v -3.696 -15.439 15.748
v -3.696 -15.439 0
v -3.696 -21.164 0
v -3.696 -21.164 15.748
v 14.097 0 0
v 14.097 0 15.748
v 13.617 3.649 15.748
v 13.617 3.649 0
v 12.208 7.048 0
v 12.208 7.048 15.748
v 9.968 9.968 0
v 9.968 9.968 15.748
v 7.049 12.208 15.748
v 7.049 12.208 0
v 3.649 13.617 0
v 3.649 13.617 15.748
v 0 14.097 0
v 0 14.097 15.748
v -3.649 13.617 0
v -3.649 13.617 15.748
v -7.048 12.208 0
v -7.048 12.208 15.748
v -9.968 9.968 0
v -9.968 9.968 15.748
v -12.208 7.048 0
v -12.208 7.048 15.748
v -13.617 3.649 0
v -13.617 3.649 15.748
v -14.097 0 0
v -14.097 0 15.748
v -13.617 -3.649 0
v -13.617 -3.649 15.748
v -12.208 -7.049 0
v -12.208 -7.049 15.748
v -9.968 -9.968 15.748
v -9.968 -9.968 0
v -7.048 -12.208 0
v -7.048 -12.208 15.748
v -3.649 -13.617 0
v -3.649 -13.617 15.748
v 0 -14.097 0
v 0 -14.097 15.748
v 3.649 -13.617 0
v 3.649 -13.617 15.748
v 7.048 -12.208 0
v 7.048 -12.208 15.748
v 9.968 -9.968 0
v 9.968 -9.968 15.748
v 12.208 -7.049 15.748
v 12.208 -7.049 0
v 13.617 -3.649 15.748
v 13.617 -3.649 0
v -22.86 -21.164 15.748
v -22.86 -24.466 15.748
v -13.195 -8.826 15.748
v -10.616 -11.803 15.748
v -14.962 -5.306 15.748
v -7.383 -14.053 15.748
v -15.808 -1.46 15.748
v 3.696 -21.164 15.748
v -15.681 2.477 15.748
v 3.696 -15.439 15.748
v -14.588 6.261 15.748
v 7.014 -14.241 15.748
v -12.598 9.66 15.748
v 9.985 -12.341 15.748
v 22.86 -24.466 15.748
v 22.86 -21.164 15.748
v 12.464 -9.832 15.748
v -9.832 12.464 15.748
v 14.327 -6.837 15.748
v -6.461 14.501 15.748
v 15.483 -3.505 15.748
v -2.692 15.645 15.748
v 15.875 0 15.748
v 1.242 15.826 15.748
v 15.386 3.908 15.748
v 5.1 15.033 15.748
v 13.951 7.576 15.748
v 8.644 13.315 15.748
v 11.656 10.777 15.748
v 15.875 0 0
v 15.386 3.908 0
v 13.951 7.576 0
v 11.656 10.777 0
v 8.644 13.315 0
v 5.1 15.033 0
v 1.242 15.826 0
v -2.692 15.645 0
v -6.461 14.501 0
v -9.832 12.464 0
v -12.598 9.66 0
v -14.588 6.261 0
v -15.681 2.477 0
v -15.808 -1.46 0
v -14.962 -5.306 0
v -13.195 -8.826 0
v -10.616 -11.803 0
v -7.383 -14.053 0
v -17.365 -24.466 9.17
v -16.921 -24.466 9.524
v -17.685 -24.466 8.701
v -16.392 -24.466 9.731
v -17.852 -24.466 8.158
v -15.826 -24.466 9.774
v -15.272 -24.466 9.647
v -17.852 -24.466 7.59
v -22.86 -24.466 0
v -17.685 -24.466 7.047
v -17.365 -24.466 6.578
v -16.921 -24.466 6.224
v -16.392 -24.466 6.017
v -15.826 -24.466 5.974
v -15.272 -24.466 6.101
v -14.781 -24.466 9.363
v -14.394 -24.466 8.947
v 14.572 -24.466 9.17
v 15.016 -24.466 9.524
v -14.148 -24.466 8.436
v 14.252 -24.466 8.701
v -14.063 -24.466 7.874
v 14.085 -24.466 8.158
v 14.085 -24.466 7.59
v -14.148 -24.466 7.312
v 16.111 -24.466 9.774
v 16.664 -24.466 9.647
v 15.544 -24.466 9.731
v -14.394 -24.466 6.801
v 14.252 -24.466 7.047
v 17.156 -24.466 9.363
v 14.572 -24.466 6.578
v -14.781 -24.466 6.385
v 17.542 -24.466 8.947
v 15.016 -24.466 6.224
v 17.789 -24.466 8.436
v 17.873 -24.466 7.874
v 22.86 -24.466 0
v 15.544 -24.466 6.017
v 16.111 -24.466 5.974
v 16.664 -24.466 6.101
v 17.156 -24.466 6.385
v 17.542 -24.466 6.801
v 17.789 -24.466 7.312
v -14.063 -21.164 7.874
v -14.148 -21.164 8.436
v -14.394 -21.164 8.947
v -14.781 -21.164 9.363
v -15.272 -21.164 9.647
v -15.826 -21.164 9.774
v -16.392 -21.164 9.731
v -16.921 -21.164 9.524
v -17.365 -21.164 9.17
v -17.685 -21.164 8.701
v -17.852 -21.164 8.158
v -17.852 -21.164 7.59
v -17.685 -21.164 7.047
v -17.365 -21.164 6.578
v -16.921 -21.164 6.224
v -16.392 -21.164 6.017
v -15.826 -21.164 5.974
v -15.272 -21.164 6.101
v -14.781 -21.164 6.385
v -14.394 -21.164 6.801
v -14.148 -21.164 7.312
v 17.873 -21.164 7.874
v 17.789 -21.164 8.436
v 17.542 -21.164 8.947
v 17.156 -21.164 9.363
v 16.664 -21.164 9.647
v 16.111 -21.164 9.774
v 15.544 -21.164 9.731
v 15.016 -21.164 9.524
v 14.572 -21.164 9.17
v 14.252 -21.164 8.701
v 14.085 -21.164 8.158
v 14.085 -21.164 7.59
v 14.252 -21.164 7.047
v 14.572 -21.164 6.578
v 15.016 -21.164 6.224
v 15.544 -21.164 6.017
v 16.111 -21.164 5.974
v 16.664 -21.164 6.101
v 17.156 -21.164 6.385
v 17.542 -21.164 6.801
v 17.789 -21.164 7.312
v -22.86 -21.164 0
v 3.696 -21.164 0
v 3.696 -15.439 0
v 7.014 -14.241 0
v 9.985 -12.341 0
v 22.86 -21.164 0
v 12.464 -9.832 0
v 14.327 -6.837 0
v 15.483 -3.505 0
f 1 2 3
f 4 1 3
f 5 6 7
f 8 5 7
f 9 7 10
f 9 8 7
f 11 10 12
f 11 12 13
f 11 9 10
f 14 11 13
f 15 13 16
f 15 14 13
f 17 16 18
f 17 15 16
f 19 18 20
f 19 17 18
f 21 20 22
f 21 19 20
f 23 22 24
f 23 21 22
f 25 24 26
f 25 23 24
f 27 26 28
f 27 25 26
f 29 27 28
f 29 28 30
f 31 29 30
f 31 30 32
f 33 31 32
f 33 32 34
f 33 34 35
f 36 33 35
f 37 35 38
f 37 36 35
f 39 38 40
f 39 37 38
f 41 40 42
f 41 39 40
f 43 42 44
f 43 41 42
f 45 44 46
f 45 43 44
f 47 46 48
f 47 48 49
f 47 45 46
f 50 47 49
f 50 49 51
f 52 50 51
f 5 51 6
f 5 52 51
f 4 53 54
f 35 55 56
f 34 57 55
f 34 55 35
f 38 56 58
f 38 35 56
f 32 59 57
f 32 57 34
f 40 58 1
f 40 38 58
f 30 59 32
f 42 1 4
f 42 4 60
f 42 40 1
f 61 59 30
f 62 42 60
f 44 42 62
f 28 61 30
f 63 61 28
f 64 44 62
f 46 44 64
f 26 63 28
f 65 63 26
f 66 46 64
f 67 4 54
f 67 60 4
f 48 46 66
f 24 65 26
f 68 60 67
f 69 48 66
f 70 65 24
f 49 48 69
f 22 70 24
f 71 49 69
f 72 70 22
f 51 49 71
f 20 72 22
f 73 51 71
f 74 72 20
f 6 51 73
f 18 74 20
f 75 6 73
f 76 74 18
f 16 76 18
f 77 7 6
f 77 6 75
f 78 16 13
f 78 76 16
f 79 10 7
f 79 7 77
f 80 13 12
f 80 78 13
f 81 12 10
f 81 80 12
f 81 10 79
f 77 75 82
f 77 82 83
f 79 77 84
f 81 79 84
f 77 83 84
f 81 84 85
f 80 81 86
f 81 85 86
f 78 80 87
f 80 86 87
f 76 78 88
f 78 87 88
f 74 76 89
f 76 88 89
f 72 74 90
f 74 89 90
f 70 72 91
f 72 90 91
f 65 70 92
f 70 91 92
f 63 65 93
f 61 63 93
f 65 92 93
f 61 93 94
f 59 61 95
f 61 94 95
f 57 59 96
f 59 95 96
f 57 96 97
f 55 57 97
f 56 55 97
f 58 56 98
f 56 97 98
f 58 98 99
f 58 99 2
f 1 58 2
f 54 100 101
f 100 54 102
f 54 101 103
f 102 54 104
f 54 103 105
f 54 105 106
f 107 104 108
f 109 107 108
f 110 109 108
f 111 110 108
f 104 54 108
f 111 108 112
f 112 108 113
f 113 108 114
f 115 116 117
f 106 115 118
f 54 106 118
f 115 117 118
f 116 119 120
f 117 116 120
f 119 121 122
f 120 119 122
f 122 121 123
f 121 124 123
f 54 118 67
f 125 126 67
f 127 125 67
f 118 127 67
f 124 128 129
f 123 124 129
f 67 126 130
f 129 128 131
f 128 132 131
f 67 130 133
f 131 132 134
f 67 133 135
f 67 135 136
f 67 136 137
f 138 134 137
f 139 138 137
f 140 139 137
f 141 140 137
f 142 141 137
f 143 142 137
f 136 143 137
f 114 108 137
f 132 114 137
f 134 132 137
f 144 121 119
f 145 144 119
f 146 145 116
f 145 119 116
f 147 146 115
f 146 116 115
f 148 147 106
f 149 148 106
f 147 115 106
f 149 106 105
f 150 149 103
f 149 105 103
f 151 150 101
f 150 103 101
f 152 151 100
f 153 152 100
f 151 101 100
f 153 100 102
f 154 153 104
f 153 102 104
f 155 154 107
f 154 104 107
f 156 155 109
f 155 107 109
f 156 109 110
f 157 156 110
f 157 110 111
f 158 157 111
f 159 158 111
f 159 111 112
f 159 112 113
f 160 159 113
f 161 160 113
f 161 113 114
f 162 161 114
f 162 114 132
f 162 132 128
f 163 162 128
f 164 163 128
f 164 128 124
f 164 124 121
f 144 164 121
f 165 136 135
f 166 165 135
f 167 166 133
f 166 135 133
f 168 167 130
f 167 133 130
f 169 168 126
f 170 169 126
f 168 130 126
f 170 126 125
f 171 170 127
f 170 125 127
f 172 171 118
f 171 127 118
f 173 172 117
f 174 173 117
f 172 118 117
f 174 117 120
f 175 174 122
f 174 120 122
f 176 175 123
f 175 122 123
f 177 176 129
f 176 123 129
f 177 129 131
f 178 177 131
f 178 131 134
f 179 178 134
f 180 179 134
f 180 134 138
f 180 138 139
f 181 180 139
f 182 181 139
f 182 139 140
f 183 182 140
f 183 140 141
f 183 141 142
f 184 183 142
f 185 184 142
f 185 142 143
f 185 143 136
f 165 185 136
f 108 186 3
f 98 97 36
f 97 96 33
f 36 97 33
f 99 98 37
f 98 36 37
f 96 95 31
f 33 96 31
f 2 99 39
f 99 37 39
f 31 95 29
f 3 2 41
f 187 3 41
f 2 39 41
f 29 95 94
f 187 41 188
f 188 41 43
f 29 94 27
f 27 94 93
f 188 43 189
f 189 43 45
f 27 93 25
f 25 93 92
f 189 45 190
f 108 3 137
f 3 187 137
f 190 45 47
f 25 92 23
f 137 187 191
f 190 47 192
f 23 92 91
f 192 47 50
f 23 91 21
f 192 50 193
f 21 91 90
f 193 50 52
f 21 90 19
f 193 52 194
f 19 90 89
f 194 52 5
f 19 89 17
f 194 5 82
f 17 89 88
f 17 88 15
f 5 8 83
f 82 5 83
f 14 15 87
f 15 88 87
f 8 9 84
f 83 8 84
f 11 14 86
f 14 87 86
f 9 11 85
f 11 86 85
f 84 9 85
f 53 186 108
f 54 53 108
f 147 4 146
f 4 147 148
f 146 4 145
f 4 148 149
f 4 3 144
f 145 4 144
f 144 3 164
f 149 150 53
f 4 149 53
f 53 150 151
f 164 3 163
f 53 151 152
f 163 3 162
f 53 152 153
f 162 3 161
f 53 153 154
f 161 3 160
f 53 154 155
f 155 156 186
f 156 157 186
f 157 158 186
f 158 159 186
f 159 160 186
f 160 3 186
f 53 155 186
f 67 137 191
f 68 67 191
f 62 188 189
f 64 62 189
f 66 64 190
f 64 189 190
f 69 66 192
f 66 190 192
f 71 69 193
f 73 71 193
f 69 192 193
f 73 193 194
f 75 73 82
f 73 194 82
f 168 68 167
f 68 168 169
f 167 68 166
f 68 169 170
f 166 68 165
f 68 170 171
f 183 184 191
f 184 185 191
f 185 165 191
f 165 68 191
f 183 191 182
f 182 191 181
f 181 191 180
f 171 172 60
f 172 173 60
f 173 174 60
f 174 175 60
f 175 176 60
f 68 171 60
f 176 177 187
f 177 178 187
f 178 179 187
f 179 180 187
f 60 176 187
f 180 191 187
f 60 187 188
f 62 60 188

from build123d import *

# Parameters (mm, degrees)
F0_R     = 14.097
F0_W     = 7.3929424398
F0_H     = 1.651
F1_DEPTH = 15.748
F2_R     = 1.905
F3_DEPTH = 9.4742


with BuildPart() as f1:
    # F0 (on Top) → F1 (new body)
    with BuildSketch(Plane.XY):
        with BuildLine():
            ThreePointArc((3.6964712199, -15.4386439016), (12.4638899549, -9.8319414254), (15.875, 0))
            ThreePointArc((15.875, 0), (-9.8319414254, 12.4638899549), (-3.6964712199, -15.4386439016))
            Line((-3.6964712199, -15.4386439016), (-3.6964712199, -15.1949884841))
            Line((-3.6964712199, -15.1949884841), (3.6964712199, -15.1949884841))
            Line((3.6964712199, -15.1949884841), (3.6964712199, -15.4386439016))
        make_face()
        Circle(F0_R, mode=Mode.SUBTRACT)
        with BuildLine():
            Line((-3.6964712199, -15.1949884841), (-3.6964712199, -15.4386439016))
            ThreePointArc((-3.6964712199, -15.4386439016), (0, -15.875), (3.6964712199, -15.4386439016))
            Line((3.6964712199, -15.4386439016), (3.6964712199, -15.1949884841))
            Line((3.6964712199, -15.1949884841), (-3.6964712199, -15.1949884841))
        make_face()
        with BuildLine():
            ThreePointArc((3.6964712199, -15.4386439016), (0, -15.875), (-3.6964712199, -15.4386439016))
            Line((-3.6964712199, -15.4386439016), (-3.6964712199, -21.1639884841))
            Line((-3.6964712199, -21.1639884841), (3.6964712199, -21.1639884841))
            Line((3.6964712199, -21.1639884841), (3.6964712199, -15.4386439016))
        make_face()
        with Locations((0, -21.9894884841)):
            Rectangle(F0_W, F0_H)
        Polygon((-3.6964712199, -22.8149884841), (-3.6964712199, -21.1639884841), (-22.86, -21.1639884841), (-22.86, -24.4659884841), (22.86, -24.4659884841), (22.86, -21.1639884841), (3.6964712199, -21.1639884841), (3.6964712199, -22.8149884841), align=None)
    extrude(amount=F1_DEPTH)

    # F2 (on face) → F3 (cut)
    with BuildSketch(Plane.XZ.offset(24.4659884841)):
        with Locations((-15.9683022648, 7.874)):
            Circle(F2_R)
        with Locations((15.9683022648, 7.874)):
            Circle(F2_R)
    extrude(amount=-F3_DEPTH, mode=Mode.SUBTRACT)


solid = f1.part
